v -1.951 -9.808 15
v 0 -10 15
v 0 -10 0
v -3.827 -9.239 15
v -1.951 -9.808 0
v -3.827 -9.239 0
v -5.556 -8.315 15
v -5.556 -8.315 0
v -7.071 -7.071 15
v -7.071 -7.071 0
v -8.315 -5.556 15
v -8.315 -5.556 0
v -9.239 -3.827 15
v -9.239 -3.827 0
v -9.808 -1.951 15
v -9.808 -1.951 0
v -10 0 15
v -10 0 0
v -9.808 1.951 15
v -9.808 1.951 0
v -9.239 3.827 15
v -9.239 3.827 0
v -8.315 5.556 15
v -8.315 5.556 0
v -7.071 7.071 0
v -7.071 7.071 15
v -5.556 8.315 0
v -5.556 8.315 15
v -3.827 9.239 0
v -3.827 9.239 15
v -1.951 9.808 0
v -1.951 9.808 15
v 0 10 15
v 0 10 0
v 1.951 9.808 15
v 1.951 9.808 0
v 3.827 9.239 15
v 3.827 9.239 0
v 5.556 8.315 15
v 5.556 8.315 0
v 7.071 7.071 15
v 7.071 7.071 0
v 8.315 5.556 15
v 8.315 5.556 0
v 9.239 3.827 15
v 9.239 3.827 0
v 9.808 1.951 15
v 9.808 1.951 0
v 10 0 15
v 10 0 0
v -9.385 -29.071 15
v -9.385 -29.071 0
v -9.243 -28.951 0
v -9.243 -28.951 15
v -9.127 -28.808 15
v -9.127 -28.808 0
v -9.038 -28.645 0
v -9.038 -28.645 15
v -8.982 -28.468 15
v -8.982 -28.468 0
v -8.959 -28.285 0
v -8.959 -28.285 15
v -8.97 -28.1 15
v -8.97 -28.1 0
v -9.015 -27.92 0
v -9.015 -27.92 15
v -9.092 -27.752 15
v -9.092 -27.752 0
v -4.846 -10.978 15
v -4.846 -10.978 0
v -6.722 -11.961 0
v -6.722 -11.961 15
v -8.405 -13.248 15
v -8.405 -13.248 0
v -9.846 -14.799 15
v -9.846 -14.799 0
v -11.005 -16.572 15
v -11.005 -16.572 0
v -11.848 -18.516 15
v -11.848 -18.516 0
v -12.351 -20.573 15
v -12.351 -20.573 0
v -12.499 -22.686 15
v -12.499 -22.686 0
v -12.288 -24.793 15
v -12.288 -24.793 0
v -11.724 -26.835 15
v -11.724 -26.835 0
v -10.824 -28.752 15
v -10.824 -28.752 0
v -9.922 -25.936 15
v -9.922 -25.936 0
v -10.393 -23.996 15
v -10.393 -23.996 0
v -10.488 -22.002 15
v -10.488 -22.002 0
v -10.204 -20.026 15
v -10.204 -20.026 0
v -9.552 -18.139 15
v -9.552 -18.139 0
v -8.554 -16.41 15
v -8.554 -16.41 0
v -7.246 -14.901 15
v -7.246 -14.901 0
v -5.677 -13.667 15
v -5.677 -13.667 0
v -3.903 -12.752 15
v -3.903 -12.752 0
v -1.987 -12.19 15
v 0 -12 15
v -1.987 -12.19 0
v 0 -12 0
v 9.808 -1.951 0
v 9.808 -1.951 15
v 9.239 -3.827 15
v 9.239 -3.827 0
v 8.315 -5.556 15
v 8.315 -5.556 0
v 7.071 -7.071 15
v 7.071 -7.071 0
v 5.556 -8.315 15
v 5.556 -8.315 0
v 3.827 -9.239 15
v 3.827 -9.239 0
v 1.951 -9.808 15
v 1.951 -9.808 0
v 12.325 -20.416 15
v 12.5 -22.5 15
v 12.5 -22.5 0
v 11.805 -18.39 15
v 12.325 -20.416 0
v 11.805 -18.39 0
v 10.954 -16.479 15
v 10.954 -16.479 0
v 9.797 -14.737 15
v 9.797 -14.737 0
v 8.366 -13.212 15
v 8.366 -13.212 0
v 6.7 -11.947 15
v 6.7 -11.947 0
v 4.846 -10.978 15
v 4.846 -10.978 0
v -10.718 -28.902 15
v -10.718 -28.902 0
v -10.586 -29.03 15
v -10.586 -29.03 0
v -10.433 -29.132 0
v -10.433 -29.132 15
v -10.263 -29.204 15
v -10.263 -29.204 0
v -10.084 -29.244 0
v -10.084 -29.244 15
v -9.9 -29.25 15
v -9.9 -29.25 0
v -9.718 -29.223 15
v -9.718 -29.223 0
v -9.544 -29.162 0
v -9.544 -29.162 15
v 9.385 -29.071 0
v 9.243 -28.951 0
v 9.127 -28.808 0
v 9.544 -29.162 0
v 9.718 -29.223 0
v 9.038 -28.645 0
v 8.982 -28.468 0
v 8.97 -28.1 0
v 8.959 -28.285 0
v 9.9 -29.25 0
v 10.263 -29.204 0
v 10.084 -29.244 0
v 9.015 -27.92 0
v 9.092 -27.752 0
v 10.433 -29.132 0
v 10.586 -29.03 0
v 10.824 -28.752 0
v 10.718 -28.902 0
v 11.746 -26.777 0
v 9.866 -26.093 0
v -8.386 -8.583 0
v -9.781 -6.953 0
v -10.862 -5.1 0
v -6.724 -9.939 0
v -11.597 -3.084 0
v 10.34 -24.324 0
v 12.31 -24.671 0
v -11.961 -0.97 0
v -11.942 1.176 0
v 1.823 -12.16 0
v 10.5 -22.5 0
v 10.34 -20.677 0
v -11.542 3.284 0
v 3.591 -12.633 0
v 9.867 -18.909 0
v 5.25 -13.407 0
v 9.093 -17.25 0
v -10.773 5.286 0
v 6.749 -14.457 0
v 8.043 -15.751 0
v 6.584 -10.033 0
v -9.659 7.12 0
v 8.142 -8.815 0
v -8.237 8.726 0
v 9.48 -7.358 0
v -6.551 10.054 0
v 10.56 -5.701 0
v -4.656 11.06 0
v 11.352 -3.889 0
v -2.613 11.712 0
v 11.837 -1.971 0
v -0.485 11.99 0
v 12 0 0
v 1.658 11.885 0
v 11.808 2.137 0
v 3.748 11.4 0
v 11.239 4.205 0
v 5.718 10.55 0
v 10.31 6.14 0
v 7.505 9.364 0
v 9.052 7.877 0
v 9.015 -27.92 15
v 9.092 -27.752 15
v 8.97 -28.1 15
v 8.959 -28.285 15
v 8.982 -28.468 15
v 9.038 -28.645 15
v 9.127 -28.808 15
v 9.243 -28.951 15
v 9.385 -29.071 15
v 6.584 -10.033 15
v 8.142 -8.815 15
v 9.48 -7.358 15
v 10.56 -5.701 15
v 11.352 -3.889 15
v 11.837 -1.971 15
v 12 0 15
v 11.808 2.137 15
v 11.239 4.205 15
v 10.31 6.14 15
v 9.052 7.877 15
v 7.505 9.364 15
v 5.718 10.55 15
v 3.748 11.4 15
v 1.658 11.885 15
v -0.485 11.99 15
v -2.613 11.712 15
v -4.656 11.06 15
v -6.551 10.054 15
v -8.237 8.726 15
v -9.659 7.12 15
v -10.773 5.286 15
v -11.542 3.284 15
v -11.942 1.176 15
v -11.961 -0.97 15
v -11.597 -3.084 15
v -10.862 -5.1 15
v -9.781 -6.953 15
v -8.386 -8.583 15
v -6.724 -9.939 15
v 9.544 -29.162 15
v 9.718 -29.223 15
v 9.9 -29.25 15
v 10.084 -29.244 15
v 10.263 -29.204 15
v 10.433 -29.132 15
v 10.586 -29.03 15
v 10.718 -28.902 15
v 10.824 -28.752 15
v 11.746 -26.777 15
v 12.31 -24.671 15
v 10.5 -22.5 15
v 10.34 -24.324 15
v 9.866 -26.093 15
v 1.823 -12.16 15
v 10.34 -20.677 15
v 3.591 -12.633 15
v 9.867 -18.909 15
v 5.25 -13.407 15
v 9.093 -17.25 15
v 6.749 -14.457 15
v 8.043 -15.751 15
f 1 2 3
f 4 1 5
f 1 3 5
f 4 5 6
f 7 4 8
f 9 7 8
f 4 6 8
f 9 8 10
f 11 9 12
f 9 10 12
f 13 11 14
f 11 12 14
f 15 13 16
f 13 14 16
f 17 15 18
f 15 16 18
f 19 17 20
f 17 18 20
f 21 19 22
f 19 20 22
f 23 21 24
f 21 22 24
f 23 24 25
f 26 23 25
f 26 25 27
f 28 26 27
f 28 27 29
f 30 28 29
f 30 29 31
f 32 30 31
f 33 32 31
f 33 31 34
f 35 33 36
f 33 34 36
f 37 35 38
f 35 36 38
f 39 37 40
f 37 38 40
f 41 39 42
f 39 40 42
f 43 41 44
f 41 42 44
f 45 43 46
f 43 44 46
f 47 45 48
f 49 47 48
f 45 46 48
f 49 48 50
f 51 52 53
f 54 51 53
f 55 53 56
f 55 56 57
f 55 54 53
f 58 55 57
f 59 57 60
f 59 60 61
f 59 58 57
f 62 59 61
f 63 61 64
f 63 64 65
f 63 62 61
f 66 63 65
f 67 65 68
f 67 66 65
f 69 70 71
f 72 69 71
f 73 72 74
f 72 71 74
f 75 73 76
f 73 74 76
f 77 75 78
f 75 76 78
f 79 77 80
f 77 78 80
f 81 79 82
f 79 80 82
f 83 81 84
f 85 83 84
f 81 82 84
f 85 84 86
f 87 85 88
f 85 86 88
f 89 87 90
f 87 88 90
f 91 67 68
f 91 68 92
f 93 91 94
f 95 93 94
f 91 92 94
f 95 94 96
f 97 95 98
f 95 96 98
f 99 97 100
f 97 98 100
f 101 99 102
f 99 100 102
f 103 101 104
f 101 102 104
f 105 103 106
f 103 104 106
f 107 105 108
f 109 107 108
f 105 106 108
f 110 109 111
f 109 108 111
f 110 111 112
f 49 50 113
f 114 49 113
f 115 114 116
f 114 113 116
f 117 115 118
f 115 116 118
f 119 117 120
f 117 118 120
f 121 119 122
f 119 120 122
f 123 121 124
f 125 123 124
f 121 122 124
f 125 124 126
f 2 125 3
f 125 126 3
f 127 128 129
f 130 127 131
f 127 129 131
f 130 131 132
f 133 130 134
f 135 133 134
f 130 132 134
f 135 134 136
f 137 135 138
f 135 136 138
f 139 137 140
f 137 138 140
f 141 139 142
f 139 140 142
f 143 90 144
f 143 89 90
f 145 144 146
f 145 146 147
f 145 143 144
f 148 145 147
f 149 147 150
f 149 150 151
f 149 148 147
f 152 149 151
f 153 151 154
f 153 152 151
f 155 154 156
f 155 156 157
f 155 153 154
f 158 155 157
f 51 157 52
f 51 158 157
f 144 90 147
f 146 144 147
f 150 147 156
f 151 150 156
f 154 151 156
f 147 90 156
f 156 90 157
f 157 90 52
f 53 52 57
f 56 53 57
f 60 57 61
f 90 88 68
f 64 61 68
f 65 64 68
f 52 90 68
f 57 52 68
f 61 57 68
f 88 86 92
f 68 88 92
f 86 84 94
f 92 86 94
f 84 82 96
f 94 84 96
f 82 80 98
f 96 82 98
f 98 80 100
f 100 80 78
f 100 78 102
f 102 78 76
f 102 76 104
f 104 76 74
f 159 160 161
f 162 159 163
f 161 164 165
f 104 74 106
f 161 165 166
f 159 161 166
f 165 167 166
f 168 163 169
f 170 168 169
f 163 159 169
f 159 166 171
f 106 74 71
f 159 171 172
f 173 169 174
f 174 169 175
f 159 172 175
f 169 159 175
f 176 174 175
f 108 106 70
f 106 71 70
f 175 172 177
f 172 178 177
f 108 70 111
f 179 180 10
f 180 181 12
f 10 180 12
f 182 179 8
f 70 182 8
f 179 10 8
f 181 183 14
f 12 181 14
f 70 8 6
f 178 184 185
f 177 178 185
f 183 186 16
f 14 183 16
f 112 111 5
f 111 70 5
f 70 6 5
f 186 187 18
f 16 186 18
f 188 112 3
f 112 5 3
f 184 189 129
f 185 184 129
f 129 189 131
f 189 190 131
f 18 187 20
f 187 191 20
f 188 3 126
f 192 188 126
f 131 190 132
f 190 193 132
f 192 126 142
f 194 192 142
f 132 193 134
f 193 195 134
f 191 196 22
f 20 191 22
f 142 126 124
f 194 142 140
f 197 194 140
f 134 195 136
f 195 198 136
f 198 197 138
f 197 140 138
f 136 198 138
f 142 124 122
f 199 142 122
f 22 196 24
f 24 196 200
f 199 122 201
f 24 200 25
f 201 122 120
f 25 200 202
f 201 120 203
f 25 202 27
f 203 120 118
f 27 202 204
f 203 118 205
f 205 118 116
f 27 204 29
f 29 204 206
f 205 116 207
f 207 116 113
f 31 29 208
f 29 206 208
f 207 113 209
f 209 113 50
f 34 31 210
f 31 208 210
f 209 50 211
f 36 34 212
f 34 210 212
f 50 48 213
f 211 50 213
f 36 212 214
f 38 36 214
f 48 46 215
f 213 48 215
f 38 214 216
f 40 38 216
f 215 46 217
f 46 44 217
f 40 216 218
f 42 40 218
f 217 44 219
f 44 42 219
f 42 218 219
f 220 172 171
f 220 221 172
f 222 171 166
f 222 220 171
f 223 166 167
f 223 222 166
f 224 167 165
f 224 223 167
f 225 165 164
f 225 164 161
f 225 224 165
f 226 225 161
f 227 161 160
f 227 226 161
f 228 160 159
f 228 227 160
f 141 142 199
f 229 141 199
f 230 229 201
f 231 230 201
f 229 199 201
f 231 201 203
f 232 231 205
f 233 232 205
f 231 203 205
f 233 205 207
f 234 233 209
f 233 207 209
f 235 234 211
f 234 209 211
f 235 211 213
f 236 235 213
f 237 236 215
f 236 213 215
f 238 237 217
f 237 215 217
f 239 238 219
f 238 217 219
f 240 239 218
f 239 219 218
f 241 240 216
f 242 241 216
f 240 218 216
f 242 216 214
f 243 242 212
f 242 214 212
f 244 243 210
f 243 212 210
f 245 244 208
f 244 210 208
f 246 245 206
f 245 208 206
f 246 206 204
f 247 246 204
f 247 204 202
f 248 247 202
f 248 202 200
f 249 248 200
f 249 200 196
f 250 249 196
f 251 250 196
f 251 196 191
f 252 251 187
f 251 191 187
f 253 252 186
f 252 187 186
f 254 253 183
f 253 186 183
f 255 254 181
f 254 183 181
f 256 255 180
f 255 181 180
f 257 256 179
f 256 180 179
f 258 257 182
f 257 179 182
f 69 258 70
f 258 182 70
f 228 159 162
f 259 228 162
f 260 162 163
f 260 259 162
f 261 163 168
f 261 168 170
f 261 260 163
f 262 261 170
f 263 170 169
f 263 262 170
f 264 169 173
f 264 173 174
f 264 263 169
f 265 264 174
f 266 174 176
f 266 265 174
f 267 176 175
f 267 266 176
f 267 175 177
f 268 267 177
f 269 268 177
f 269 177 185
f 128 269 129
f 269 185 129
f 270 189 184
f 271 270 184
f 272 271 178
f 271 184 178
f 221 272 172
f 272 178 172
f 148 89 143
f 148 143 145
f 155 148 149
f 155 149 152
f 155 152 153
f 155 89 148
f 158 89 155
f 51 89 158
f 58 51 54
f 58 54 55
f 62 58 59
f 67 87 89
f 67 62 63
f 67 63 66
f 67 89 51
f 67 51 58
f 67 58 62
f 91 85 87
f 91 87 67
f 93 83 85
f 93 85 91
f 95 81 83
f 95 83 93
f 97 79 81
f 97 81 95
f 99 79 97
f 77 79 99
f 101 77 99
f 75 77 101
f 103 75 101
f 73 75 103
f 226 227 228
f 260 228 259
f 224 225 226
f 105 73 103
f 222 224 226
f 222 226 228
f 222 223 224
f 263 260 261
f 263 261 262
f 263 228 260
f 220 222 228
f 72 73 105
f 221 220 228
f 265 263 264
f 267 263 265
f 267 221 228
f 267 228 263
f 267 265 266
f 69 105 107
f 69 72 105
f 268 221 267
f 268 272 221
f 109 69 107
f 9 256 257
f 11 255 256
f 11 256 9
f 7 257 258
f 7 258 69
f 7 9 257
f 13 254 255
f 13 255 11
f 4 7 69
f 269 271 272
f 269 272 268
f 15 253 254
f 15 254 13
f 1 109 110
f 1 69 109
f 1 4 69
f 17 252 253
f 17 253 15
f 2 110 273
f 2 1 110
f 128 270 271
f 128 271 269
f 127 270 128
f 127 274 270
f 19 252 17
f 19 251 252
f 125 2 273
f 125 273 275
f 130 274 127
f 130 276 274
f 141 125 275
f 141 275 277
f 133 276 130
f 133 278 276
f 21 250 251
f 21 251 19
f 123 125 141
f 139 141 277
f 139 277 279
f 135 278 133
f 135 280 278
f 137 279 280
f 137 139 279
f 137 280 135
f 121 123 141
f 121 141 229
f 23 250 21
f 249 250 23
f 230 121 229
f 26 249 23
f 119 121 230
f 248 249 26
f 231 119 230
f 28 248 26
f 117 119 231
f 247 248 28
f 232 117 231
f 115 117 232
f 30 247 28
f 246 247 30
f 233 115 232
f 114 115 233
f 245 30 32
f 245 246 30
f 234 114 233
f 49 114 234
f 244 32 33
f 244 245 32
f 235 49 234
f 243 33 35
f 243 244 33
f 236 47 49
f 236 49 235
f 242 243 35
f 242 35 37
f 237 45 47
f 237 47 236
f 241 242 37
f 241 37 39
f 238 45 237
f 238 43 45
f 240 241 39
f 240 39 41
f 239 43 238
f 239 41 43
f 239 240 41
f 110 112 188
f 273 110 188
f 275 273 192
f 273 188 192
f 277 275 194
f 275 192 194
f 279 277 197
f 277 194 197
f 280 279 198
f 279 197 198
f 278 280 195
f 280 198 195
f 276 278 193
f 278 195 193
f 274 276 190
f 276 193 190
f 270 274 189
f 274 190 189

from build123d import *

# Parameters (mm, degrees)
F1_DEPTH = 15
F2_R     = 0.99999


# Not quite as in the source:
# - a fillet or chamfer is up to 0.001 mm smaller than in the source, because OpenCascade refuses the exact size


with BuildPart() as f1:
    # F0 (on Top) → F1 (new body)
    with BuildSketch(Plane.XY):
        with BuildLine():
            ThreePointArc((-4.8464827516, -10.9777777778), (-2.4720661624, -10.2468824829), (0, -10))
            ThreePointArc((0, -10), (2.4720661624, -10.2468824829), (4.8464827516, -10.9777777778))
            ThreePointArc((4.8464827516, -10.9777777778), (10.0538001029, -6.5514199598), (12, 0))
            ThreePointArc((12, 0), (-6.5514199598, 10.0538001029), (-4.8464827516, -10.9777777778))
        make_face()
        with BuildLine():
            ThreePointArc((0, -10), (-7.0710678119, 7.0710678119), (10, 0))
            ThreePointArc((10, 0), (7.0710678119, -7.0710678119), (0, -10))
        make_face(mode=Mode.SUBTRACT)
        with BuildLine():
            ThreePointArc((4.8464827516, -10.9777777778), (2.4720661624, -10.2468824829), (0, -10))
            ThreePointArc((0, -10), (-2.4720661624, -10.2468824829), (-4.8464827516, -10.9777777778))
            ThreePointArc((-4.8464827516, -10.9777777778), (-2.4765567495, -11.7416637095), (0, -12))
            ThreePointArc((0, -12), (2.4765567495, -11.7416637095), (4.8464827516, -10.9777777778))
        make_face()
        with BuildLine():
            ThreePointArc((12.5, -22.5), (10.412277234, -15.5837522599), (4.8464827516, -10.9777777778))
            ThreePointArc((4.8464827516, -10.9777777778), (2.4765567495, -11.7416637095), (0, -12))
            ThreePointArc((0, -12), (7.4246212025, -15.0753787975), (10.5, -22.5))
            ThreePointArc((10.5, -22.5), (10.0140279829, -25.6574108948), (8.601096465, -28.5225525817))
            Line((8.601096465, -28.5225525817), (10.2394005536, -29.6697054544))
            ThreePointArc((10.2394005536, -29.6697054544), (11.9214618844, -26.2588224938), (12.5, -22.5))
        make_face()
        with BuildLine():
            ThreePointArc((0, -12), (-2.4765567495, -11.7416637095), (-4.8464827516, -10.9777777778))
            ThreePointArc((-4.8464827516, -10.9777777778), (-12.0101211002, -19.034889445), (-10.2394005536, -29.6697054544))
            Line((-10.2394005536, -29.6697054544), (-8.601096465, -28.5225525817))
            ThreePointArc((-8.601096465, -28.5225525817), (-9.3136137484, -17.651639561), (0, -12))
        make_face()
    extrude(amount=F1_DEPTH)

    # F2 (radius 1 in the source; OpenCascade refuses exactly that, so slightly less here)
    f2_edges = [f1.edges().sort_by_distance(p)[0] for p in [
        (-8.601096, -28.522553, 7.5),
        (-10.239401, -29.669705, 7.5),
        (8.601096, -28.522553, 7.5),
        (10.239401, -29.669705, 7.5),
    ]]
    fillet(f2_edges, radius=F2_R)


solid = f1.part
